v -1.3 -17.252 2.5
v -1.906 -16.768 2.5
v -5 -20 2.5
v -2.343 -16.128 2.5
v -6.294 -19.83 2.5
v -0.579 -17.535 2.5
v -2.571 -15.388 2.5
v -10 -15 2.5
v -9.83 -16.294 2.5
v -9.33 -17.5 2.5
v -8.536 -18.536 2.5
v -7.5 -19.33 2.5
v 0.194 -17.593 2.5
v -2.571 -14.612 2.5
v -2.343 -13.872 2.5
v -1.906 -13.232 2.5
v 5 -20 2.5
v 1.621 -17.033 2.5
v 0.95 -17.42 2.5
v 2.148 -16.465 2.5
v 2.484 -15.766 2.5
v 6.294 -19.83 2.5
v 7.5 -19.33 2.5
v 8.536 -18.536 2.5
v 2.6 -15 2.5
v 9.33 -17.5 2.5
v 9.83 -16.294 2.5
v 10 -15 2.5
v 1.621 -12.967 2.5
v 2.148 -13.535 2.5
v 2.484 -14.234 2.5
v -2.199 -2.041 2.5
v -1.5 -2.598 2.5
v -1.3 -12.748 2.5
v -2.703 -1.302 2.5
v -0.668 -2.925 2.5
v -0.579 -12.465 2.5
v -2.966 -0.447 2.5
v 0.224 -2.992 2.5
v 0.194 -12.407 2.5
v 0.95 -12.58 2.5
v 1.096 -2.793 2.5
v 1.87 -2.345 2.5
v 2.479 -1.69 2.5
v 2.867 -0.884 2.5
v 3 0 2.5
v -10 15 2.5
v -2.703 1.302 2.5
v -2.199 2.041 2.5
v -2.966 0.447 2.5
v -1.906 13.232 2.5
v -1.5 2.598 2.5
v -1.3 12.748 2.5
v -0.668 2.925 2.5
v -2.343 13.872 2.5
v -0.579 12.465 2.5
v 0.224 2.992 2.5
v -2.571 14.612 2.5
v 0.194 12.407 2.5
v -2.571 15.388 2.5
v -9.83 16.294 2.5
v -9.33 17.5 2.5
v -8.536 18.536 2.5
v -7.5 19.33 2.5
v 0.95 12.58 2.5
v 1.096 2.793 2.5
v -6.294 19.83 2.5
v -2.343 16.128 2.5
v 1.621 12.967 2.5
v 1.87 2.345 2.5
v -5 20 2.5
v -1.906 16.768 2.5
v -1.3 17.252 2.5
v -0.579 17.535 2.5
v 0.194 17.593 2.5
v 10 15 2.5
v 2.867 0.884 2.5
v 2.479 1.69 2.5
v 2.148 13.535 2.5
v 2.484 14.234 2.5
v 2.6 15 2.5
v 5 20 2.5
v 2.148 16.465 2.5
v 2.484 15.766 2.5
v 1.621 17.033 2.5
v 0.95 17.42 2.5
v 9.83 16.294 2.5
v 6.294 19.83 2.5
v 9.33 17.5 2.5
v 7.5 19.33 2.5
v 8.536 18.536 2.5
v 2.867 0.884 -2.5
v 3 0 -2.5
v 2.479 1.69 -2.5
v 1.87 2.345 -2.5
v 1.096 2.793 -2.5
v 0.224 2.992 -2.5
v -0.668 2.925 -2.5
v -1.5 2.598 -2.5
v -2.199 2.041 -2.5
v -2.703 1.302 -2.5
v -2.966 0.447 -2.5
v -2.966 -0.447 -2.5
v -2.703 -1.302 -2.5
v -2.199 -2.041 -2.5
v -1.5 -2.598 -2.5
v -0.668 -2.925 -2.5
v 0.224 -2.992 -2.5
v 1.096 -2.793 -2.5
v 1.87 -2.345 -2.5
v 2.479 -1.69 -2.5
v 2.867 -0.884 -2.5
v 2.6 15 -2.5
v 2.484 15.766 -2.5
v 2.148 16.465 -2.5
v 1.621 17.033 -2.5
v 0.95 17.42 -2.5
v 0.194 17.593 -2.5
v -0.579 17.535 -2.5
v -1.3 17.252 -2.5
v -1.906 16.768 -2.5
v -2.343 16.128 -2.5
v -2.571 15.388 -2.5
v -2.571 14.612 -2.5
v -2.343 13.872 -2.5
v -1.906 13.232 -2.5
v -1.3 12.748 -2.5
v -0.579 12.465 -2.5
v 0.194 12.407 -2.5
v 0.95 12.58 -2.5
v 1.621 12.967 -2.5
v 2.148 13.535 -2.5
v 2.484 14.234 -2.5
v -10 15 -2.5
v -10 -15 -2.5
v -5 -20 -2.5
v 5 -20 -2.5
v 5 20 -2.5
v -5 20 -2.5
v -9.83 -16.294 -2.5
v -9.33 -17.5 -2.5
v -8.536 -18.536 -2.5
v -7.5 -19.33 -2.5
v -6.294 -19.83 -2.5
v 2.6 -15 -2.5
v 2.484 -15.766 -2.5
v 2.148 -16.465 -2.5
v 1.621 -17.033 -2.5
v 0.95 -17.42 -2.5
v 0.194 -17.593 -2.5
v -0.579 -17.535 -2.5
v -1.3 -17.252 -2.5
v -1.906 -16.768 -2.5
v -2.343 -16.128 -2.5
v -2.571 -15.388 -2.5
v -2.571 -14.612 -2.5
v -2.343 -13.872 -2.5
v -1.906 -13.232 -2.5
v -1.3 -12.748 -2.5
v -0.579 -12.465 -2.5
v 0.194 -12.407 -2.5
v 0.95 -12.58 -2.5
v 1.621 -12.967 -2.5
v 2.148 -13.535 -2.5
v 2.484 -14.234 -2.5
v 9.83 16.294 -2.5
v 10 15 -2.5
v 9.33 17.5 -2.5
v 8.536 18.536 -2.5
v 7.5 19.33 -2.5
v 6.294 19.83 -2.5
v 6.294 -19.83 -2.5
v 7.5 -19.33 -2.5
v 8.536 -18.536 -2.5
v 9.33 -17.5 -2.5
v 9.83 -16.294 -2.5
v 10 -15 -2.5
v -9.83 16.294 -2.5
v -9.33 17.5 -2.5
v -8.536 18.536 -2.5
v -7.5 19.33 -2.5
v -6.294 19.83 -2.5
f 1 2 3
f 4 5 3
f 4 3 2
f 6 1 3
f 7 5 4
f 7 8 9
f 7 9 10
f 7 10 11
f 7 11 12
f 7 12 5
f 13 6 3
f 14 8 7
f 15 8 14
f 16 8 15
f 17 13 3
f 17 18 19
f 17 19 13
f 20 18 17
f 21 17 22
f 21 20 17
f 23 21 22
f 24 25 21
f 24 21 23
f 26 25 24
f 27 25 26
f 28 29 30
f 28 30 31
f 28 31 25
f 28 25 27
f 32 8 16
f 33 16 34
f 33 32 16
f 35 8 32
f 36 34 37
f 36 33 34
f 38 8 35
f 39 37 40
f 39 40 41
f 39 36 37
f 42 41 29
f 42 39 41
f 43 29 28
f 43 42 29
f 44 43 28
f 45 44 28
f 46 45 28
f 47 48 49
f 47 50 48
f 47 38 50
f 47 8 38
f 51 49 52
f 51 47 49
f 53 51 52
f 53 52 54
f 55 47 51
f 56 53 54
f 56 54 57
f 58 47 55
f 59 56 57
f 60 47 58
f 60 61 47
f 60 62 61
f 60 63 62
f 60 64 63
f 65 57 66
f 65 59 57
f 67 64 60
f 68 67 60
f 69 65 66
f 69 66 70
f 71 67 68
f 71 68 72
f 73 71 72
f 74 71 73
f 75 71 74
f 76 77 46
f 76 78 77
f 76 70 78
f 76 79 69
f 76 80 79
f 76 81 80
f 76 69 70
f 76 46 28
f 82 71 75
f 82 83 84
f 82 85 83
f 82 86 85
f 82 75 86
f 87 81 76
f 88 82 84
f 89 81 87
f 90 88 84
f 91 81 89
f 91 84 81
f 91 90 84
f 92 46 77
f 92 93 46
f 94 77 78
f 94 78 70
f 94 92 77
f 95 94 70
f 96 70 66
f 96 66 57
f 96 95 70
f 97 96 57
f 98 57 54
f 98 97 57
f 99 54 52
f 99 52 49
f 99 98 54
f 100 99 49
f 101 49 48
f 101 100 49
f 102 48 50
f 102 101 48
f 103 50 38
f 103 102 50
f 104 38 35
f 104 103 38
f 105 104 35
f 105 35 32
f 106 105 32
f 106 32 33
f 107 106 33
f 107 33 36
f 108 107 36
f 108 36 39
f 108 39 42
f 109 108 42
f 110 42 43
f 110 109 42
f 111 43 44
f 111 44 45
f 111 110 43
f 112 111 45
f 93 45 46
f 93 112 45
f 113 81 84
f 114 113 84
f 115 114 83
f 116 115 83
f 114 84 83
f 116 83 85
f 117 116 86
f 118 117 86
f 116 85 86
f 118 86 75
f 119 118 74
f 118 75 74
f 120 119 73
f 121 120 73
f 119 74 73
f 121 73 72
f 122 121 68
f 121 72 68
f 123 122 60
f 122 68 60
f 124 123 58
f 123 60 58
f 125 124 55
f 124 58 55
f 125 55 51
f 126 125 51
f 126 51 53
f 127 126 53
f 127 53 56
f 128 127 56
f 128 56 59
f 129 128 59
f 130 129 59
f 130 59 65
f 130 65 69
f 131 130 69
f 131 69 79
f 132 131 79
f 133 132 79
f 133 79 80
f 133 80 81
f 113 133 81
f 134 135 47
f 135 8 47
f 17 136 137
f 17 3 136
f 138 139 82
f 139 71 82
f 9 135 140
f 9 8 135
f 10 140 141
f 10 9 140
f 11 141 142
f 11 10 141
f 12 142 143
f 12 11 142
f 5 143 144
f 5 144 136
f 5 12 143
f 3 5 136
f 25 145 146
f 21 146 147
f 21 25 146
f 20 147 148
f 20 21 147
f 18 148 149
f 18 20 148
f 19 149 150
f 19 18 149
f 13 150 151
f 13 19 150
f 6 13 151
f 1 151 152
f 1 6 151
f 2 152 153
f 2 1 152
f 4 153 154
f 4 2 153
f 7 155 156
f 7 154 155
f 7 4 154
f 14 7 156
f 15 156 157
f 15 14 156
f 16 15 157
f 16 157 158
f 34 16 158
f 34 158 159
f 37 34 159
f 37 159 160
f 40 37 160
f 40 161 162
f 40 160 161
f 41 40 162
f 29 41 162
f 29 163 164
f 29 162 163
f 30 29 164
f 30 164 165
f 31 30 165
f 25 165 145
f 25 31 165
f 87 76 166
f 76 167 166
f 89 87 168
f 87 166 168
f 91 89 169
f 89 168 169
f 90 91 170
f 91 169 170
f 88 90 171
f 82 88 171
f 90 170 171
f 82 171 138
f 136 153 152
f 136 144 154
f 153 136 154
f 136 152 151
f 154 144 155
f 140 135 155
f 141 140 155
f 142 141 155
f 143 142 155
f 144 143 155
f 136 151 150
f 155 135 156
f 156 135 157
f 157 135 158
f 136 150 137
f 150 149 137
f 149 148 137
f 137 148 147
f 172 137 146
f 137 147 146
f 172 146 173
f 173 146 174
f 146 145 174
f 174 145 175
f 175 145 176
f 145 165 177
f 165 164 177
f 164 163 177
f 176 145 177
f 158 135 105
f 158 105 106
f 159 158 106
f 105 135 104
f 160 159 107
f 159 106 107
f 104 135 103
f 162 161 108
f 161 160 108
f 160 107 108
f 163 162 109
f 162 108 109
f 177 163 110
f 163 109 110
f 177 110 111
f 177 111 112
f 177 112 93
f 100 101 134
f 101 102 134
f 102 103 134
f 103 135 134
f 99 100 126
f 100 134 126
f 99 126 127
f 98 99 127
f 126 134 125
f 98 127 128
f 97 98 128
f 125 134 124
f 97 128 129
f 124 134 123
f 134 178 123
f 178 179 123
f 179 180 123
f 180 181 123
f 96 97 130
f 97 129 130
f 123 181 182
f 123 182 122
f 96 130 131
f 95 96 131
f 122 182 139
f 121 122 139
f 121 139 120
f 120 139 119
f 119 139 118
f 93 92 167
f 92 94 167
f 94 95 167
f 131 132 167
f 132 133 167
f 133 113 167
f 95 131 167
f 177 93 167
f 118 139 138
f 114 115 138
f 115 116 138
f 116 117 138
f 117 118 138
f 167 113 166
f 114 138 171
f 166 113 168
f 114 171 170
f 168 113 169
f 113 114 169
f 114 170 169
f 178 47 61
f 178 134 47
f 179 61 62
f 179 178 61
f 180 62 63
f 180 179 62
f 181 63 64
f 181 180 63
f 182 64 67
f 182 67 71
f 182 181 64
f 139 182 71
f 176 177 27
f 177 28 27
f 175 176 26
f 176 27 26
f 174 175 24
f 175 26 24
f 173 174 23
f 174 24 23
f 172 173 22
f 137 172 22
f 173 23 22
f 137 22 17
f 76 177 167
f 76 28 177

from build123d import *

# Parameters (mm, degrees)
ESBO_O1_W                = 20
ESBO_O1_H                = 40
ESBO_O1_R                = 3
RESSALTO_EXTRUS_O1_DEPTH = 2.5
FILETE1_R                = 5
ESBO_O2_R                = 2.6
CORTE_EXTRUS_O1_DEPTH    = 6


with BuildPart() as part:
    # Esboço1 → Ressalto-extrusão1 (new, symmetric)
    with BuildSketch(Plane.XY):
        Rectangle(ESBO_O1_W, ESBO_O1_H)
        Circle(ESBO_O1_R, mode=Mode.SUBTRACT)
    extrude(amount=RESSALTO_EXTRUS_O1_DEPTH, both=True)

    # Filete1
    filete1_edges = [part.edges().sort_by_distance(p)[0] for p in [
        (10, -20, 0),
        (-10, -20, 0),
        (-10, 20, 0),
        (10, 20, 0),
    ]]
    fillet(filete1_edges, radius=FILETE1_R)

    # Esboço2 → Corte-extrusão1 (cut)
    with BuildSketch(Plane.XY.offset(2.5)):
        with Locations((0, 15)):
            Circle(ESBO_O2_R)
    corte_extrus_o1 = extrude(amount=-CORTE_EXTRUS_O1_DEPTH, mode=Mode.SUBTRACT)

    # Espelhar1: Corte-extrusão1 across plane
    add(corte_extrus_o1.mirror(Plane.ZX), mode=Mode.SUBTRACT)


solid = part.part
